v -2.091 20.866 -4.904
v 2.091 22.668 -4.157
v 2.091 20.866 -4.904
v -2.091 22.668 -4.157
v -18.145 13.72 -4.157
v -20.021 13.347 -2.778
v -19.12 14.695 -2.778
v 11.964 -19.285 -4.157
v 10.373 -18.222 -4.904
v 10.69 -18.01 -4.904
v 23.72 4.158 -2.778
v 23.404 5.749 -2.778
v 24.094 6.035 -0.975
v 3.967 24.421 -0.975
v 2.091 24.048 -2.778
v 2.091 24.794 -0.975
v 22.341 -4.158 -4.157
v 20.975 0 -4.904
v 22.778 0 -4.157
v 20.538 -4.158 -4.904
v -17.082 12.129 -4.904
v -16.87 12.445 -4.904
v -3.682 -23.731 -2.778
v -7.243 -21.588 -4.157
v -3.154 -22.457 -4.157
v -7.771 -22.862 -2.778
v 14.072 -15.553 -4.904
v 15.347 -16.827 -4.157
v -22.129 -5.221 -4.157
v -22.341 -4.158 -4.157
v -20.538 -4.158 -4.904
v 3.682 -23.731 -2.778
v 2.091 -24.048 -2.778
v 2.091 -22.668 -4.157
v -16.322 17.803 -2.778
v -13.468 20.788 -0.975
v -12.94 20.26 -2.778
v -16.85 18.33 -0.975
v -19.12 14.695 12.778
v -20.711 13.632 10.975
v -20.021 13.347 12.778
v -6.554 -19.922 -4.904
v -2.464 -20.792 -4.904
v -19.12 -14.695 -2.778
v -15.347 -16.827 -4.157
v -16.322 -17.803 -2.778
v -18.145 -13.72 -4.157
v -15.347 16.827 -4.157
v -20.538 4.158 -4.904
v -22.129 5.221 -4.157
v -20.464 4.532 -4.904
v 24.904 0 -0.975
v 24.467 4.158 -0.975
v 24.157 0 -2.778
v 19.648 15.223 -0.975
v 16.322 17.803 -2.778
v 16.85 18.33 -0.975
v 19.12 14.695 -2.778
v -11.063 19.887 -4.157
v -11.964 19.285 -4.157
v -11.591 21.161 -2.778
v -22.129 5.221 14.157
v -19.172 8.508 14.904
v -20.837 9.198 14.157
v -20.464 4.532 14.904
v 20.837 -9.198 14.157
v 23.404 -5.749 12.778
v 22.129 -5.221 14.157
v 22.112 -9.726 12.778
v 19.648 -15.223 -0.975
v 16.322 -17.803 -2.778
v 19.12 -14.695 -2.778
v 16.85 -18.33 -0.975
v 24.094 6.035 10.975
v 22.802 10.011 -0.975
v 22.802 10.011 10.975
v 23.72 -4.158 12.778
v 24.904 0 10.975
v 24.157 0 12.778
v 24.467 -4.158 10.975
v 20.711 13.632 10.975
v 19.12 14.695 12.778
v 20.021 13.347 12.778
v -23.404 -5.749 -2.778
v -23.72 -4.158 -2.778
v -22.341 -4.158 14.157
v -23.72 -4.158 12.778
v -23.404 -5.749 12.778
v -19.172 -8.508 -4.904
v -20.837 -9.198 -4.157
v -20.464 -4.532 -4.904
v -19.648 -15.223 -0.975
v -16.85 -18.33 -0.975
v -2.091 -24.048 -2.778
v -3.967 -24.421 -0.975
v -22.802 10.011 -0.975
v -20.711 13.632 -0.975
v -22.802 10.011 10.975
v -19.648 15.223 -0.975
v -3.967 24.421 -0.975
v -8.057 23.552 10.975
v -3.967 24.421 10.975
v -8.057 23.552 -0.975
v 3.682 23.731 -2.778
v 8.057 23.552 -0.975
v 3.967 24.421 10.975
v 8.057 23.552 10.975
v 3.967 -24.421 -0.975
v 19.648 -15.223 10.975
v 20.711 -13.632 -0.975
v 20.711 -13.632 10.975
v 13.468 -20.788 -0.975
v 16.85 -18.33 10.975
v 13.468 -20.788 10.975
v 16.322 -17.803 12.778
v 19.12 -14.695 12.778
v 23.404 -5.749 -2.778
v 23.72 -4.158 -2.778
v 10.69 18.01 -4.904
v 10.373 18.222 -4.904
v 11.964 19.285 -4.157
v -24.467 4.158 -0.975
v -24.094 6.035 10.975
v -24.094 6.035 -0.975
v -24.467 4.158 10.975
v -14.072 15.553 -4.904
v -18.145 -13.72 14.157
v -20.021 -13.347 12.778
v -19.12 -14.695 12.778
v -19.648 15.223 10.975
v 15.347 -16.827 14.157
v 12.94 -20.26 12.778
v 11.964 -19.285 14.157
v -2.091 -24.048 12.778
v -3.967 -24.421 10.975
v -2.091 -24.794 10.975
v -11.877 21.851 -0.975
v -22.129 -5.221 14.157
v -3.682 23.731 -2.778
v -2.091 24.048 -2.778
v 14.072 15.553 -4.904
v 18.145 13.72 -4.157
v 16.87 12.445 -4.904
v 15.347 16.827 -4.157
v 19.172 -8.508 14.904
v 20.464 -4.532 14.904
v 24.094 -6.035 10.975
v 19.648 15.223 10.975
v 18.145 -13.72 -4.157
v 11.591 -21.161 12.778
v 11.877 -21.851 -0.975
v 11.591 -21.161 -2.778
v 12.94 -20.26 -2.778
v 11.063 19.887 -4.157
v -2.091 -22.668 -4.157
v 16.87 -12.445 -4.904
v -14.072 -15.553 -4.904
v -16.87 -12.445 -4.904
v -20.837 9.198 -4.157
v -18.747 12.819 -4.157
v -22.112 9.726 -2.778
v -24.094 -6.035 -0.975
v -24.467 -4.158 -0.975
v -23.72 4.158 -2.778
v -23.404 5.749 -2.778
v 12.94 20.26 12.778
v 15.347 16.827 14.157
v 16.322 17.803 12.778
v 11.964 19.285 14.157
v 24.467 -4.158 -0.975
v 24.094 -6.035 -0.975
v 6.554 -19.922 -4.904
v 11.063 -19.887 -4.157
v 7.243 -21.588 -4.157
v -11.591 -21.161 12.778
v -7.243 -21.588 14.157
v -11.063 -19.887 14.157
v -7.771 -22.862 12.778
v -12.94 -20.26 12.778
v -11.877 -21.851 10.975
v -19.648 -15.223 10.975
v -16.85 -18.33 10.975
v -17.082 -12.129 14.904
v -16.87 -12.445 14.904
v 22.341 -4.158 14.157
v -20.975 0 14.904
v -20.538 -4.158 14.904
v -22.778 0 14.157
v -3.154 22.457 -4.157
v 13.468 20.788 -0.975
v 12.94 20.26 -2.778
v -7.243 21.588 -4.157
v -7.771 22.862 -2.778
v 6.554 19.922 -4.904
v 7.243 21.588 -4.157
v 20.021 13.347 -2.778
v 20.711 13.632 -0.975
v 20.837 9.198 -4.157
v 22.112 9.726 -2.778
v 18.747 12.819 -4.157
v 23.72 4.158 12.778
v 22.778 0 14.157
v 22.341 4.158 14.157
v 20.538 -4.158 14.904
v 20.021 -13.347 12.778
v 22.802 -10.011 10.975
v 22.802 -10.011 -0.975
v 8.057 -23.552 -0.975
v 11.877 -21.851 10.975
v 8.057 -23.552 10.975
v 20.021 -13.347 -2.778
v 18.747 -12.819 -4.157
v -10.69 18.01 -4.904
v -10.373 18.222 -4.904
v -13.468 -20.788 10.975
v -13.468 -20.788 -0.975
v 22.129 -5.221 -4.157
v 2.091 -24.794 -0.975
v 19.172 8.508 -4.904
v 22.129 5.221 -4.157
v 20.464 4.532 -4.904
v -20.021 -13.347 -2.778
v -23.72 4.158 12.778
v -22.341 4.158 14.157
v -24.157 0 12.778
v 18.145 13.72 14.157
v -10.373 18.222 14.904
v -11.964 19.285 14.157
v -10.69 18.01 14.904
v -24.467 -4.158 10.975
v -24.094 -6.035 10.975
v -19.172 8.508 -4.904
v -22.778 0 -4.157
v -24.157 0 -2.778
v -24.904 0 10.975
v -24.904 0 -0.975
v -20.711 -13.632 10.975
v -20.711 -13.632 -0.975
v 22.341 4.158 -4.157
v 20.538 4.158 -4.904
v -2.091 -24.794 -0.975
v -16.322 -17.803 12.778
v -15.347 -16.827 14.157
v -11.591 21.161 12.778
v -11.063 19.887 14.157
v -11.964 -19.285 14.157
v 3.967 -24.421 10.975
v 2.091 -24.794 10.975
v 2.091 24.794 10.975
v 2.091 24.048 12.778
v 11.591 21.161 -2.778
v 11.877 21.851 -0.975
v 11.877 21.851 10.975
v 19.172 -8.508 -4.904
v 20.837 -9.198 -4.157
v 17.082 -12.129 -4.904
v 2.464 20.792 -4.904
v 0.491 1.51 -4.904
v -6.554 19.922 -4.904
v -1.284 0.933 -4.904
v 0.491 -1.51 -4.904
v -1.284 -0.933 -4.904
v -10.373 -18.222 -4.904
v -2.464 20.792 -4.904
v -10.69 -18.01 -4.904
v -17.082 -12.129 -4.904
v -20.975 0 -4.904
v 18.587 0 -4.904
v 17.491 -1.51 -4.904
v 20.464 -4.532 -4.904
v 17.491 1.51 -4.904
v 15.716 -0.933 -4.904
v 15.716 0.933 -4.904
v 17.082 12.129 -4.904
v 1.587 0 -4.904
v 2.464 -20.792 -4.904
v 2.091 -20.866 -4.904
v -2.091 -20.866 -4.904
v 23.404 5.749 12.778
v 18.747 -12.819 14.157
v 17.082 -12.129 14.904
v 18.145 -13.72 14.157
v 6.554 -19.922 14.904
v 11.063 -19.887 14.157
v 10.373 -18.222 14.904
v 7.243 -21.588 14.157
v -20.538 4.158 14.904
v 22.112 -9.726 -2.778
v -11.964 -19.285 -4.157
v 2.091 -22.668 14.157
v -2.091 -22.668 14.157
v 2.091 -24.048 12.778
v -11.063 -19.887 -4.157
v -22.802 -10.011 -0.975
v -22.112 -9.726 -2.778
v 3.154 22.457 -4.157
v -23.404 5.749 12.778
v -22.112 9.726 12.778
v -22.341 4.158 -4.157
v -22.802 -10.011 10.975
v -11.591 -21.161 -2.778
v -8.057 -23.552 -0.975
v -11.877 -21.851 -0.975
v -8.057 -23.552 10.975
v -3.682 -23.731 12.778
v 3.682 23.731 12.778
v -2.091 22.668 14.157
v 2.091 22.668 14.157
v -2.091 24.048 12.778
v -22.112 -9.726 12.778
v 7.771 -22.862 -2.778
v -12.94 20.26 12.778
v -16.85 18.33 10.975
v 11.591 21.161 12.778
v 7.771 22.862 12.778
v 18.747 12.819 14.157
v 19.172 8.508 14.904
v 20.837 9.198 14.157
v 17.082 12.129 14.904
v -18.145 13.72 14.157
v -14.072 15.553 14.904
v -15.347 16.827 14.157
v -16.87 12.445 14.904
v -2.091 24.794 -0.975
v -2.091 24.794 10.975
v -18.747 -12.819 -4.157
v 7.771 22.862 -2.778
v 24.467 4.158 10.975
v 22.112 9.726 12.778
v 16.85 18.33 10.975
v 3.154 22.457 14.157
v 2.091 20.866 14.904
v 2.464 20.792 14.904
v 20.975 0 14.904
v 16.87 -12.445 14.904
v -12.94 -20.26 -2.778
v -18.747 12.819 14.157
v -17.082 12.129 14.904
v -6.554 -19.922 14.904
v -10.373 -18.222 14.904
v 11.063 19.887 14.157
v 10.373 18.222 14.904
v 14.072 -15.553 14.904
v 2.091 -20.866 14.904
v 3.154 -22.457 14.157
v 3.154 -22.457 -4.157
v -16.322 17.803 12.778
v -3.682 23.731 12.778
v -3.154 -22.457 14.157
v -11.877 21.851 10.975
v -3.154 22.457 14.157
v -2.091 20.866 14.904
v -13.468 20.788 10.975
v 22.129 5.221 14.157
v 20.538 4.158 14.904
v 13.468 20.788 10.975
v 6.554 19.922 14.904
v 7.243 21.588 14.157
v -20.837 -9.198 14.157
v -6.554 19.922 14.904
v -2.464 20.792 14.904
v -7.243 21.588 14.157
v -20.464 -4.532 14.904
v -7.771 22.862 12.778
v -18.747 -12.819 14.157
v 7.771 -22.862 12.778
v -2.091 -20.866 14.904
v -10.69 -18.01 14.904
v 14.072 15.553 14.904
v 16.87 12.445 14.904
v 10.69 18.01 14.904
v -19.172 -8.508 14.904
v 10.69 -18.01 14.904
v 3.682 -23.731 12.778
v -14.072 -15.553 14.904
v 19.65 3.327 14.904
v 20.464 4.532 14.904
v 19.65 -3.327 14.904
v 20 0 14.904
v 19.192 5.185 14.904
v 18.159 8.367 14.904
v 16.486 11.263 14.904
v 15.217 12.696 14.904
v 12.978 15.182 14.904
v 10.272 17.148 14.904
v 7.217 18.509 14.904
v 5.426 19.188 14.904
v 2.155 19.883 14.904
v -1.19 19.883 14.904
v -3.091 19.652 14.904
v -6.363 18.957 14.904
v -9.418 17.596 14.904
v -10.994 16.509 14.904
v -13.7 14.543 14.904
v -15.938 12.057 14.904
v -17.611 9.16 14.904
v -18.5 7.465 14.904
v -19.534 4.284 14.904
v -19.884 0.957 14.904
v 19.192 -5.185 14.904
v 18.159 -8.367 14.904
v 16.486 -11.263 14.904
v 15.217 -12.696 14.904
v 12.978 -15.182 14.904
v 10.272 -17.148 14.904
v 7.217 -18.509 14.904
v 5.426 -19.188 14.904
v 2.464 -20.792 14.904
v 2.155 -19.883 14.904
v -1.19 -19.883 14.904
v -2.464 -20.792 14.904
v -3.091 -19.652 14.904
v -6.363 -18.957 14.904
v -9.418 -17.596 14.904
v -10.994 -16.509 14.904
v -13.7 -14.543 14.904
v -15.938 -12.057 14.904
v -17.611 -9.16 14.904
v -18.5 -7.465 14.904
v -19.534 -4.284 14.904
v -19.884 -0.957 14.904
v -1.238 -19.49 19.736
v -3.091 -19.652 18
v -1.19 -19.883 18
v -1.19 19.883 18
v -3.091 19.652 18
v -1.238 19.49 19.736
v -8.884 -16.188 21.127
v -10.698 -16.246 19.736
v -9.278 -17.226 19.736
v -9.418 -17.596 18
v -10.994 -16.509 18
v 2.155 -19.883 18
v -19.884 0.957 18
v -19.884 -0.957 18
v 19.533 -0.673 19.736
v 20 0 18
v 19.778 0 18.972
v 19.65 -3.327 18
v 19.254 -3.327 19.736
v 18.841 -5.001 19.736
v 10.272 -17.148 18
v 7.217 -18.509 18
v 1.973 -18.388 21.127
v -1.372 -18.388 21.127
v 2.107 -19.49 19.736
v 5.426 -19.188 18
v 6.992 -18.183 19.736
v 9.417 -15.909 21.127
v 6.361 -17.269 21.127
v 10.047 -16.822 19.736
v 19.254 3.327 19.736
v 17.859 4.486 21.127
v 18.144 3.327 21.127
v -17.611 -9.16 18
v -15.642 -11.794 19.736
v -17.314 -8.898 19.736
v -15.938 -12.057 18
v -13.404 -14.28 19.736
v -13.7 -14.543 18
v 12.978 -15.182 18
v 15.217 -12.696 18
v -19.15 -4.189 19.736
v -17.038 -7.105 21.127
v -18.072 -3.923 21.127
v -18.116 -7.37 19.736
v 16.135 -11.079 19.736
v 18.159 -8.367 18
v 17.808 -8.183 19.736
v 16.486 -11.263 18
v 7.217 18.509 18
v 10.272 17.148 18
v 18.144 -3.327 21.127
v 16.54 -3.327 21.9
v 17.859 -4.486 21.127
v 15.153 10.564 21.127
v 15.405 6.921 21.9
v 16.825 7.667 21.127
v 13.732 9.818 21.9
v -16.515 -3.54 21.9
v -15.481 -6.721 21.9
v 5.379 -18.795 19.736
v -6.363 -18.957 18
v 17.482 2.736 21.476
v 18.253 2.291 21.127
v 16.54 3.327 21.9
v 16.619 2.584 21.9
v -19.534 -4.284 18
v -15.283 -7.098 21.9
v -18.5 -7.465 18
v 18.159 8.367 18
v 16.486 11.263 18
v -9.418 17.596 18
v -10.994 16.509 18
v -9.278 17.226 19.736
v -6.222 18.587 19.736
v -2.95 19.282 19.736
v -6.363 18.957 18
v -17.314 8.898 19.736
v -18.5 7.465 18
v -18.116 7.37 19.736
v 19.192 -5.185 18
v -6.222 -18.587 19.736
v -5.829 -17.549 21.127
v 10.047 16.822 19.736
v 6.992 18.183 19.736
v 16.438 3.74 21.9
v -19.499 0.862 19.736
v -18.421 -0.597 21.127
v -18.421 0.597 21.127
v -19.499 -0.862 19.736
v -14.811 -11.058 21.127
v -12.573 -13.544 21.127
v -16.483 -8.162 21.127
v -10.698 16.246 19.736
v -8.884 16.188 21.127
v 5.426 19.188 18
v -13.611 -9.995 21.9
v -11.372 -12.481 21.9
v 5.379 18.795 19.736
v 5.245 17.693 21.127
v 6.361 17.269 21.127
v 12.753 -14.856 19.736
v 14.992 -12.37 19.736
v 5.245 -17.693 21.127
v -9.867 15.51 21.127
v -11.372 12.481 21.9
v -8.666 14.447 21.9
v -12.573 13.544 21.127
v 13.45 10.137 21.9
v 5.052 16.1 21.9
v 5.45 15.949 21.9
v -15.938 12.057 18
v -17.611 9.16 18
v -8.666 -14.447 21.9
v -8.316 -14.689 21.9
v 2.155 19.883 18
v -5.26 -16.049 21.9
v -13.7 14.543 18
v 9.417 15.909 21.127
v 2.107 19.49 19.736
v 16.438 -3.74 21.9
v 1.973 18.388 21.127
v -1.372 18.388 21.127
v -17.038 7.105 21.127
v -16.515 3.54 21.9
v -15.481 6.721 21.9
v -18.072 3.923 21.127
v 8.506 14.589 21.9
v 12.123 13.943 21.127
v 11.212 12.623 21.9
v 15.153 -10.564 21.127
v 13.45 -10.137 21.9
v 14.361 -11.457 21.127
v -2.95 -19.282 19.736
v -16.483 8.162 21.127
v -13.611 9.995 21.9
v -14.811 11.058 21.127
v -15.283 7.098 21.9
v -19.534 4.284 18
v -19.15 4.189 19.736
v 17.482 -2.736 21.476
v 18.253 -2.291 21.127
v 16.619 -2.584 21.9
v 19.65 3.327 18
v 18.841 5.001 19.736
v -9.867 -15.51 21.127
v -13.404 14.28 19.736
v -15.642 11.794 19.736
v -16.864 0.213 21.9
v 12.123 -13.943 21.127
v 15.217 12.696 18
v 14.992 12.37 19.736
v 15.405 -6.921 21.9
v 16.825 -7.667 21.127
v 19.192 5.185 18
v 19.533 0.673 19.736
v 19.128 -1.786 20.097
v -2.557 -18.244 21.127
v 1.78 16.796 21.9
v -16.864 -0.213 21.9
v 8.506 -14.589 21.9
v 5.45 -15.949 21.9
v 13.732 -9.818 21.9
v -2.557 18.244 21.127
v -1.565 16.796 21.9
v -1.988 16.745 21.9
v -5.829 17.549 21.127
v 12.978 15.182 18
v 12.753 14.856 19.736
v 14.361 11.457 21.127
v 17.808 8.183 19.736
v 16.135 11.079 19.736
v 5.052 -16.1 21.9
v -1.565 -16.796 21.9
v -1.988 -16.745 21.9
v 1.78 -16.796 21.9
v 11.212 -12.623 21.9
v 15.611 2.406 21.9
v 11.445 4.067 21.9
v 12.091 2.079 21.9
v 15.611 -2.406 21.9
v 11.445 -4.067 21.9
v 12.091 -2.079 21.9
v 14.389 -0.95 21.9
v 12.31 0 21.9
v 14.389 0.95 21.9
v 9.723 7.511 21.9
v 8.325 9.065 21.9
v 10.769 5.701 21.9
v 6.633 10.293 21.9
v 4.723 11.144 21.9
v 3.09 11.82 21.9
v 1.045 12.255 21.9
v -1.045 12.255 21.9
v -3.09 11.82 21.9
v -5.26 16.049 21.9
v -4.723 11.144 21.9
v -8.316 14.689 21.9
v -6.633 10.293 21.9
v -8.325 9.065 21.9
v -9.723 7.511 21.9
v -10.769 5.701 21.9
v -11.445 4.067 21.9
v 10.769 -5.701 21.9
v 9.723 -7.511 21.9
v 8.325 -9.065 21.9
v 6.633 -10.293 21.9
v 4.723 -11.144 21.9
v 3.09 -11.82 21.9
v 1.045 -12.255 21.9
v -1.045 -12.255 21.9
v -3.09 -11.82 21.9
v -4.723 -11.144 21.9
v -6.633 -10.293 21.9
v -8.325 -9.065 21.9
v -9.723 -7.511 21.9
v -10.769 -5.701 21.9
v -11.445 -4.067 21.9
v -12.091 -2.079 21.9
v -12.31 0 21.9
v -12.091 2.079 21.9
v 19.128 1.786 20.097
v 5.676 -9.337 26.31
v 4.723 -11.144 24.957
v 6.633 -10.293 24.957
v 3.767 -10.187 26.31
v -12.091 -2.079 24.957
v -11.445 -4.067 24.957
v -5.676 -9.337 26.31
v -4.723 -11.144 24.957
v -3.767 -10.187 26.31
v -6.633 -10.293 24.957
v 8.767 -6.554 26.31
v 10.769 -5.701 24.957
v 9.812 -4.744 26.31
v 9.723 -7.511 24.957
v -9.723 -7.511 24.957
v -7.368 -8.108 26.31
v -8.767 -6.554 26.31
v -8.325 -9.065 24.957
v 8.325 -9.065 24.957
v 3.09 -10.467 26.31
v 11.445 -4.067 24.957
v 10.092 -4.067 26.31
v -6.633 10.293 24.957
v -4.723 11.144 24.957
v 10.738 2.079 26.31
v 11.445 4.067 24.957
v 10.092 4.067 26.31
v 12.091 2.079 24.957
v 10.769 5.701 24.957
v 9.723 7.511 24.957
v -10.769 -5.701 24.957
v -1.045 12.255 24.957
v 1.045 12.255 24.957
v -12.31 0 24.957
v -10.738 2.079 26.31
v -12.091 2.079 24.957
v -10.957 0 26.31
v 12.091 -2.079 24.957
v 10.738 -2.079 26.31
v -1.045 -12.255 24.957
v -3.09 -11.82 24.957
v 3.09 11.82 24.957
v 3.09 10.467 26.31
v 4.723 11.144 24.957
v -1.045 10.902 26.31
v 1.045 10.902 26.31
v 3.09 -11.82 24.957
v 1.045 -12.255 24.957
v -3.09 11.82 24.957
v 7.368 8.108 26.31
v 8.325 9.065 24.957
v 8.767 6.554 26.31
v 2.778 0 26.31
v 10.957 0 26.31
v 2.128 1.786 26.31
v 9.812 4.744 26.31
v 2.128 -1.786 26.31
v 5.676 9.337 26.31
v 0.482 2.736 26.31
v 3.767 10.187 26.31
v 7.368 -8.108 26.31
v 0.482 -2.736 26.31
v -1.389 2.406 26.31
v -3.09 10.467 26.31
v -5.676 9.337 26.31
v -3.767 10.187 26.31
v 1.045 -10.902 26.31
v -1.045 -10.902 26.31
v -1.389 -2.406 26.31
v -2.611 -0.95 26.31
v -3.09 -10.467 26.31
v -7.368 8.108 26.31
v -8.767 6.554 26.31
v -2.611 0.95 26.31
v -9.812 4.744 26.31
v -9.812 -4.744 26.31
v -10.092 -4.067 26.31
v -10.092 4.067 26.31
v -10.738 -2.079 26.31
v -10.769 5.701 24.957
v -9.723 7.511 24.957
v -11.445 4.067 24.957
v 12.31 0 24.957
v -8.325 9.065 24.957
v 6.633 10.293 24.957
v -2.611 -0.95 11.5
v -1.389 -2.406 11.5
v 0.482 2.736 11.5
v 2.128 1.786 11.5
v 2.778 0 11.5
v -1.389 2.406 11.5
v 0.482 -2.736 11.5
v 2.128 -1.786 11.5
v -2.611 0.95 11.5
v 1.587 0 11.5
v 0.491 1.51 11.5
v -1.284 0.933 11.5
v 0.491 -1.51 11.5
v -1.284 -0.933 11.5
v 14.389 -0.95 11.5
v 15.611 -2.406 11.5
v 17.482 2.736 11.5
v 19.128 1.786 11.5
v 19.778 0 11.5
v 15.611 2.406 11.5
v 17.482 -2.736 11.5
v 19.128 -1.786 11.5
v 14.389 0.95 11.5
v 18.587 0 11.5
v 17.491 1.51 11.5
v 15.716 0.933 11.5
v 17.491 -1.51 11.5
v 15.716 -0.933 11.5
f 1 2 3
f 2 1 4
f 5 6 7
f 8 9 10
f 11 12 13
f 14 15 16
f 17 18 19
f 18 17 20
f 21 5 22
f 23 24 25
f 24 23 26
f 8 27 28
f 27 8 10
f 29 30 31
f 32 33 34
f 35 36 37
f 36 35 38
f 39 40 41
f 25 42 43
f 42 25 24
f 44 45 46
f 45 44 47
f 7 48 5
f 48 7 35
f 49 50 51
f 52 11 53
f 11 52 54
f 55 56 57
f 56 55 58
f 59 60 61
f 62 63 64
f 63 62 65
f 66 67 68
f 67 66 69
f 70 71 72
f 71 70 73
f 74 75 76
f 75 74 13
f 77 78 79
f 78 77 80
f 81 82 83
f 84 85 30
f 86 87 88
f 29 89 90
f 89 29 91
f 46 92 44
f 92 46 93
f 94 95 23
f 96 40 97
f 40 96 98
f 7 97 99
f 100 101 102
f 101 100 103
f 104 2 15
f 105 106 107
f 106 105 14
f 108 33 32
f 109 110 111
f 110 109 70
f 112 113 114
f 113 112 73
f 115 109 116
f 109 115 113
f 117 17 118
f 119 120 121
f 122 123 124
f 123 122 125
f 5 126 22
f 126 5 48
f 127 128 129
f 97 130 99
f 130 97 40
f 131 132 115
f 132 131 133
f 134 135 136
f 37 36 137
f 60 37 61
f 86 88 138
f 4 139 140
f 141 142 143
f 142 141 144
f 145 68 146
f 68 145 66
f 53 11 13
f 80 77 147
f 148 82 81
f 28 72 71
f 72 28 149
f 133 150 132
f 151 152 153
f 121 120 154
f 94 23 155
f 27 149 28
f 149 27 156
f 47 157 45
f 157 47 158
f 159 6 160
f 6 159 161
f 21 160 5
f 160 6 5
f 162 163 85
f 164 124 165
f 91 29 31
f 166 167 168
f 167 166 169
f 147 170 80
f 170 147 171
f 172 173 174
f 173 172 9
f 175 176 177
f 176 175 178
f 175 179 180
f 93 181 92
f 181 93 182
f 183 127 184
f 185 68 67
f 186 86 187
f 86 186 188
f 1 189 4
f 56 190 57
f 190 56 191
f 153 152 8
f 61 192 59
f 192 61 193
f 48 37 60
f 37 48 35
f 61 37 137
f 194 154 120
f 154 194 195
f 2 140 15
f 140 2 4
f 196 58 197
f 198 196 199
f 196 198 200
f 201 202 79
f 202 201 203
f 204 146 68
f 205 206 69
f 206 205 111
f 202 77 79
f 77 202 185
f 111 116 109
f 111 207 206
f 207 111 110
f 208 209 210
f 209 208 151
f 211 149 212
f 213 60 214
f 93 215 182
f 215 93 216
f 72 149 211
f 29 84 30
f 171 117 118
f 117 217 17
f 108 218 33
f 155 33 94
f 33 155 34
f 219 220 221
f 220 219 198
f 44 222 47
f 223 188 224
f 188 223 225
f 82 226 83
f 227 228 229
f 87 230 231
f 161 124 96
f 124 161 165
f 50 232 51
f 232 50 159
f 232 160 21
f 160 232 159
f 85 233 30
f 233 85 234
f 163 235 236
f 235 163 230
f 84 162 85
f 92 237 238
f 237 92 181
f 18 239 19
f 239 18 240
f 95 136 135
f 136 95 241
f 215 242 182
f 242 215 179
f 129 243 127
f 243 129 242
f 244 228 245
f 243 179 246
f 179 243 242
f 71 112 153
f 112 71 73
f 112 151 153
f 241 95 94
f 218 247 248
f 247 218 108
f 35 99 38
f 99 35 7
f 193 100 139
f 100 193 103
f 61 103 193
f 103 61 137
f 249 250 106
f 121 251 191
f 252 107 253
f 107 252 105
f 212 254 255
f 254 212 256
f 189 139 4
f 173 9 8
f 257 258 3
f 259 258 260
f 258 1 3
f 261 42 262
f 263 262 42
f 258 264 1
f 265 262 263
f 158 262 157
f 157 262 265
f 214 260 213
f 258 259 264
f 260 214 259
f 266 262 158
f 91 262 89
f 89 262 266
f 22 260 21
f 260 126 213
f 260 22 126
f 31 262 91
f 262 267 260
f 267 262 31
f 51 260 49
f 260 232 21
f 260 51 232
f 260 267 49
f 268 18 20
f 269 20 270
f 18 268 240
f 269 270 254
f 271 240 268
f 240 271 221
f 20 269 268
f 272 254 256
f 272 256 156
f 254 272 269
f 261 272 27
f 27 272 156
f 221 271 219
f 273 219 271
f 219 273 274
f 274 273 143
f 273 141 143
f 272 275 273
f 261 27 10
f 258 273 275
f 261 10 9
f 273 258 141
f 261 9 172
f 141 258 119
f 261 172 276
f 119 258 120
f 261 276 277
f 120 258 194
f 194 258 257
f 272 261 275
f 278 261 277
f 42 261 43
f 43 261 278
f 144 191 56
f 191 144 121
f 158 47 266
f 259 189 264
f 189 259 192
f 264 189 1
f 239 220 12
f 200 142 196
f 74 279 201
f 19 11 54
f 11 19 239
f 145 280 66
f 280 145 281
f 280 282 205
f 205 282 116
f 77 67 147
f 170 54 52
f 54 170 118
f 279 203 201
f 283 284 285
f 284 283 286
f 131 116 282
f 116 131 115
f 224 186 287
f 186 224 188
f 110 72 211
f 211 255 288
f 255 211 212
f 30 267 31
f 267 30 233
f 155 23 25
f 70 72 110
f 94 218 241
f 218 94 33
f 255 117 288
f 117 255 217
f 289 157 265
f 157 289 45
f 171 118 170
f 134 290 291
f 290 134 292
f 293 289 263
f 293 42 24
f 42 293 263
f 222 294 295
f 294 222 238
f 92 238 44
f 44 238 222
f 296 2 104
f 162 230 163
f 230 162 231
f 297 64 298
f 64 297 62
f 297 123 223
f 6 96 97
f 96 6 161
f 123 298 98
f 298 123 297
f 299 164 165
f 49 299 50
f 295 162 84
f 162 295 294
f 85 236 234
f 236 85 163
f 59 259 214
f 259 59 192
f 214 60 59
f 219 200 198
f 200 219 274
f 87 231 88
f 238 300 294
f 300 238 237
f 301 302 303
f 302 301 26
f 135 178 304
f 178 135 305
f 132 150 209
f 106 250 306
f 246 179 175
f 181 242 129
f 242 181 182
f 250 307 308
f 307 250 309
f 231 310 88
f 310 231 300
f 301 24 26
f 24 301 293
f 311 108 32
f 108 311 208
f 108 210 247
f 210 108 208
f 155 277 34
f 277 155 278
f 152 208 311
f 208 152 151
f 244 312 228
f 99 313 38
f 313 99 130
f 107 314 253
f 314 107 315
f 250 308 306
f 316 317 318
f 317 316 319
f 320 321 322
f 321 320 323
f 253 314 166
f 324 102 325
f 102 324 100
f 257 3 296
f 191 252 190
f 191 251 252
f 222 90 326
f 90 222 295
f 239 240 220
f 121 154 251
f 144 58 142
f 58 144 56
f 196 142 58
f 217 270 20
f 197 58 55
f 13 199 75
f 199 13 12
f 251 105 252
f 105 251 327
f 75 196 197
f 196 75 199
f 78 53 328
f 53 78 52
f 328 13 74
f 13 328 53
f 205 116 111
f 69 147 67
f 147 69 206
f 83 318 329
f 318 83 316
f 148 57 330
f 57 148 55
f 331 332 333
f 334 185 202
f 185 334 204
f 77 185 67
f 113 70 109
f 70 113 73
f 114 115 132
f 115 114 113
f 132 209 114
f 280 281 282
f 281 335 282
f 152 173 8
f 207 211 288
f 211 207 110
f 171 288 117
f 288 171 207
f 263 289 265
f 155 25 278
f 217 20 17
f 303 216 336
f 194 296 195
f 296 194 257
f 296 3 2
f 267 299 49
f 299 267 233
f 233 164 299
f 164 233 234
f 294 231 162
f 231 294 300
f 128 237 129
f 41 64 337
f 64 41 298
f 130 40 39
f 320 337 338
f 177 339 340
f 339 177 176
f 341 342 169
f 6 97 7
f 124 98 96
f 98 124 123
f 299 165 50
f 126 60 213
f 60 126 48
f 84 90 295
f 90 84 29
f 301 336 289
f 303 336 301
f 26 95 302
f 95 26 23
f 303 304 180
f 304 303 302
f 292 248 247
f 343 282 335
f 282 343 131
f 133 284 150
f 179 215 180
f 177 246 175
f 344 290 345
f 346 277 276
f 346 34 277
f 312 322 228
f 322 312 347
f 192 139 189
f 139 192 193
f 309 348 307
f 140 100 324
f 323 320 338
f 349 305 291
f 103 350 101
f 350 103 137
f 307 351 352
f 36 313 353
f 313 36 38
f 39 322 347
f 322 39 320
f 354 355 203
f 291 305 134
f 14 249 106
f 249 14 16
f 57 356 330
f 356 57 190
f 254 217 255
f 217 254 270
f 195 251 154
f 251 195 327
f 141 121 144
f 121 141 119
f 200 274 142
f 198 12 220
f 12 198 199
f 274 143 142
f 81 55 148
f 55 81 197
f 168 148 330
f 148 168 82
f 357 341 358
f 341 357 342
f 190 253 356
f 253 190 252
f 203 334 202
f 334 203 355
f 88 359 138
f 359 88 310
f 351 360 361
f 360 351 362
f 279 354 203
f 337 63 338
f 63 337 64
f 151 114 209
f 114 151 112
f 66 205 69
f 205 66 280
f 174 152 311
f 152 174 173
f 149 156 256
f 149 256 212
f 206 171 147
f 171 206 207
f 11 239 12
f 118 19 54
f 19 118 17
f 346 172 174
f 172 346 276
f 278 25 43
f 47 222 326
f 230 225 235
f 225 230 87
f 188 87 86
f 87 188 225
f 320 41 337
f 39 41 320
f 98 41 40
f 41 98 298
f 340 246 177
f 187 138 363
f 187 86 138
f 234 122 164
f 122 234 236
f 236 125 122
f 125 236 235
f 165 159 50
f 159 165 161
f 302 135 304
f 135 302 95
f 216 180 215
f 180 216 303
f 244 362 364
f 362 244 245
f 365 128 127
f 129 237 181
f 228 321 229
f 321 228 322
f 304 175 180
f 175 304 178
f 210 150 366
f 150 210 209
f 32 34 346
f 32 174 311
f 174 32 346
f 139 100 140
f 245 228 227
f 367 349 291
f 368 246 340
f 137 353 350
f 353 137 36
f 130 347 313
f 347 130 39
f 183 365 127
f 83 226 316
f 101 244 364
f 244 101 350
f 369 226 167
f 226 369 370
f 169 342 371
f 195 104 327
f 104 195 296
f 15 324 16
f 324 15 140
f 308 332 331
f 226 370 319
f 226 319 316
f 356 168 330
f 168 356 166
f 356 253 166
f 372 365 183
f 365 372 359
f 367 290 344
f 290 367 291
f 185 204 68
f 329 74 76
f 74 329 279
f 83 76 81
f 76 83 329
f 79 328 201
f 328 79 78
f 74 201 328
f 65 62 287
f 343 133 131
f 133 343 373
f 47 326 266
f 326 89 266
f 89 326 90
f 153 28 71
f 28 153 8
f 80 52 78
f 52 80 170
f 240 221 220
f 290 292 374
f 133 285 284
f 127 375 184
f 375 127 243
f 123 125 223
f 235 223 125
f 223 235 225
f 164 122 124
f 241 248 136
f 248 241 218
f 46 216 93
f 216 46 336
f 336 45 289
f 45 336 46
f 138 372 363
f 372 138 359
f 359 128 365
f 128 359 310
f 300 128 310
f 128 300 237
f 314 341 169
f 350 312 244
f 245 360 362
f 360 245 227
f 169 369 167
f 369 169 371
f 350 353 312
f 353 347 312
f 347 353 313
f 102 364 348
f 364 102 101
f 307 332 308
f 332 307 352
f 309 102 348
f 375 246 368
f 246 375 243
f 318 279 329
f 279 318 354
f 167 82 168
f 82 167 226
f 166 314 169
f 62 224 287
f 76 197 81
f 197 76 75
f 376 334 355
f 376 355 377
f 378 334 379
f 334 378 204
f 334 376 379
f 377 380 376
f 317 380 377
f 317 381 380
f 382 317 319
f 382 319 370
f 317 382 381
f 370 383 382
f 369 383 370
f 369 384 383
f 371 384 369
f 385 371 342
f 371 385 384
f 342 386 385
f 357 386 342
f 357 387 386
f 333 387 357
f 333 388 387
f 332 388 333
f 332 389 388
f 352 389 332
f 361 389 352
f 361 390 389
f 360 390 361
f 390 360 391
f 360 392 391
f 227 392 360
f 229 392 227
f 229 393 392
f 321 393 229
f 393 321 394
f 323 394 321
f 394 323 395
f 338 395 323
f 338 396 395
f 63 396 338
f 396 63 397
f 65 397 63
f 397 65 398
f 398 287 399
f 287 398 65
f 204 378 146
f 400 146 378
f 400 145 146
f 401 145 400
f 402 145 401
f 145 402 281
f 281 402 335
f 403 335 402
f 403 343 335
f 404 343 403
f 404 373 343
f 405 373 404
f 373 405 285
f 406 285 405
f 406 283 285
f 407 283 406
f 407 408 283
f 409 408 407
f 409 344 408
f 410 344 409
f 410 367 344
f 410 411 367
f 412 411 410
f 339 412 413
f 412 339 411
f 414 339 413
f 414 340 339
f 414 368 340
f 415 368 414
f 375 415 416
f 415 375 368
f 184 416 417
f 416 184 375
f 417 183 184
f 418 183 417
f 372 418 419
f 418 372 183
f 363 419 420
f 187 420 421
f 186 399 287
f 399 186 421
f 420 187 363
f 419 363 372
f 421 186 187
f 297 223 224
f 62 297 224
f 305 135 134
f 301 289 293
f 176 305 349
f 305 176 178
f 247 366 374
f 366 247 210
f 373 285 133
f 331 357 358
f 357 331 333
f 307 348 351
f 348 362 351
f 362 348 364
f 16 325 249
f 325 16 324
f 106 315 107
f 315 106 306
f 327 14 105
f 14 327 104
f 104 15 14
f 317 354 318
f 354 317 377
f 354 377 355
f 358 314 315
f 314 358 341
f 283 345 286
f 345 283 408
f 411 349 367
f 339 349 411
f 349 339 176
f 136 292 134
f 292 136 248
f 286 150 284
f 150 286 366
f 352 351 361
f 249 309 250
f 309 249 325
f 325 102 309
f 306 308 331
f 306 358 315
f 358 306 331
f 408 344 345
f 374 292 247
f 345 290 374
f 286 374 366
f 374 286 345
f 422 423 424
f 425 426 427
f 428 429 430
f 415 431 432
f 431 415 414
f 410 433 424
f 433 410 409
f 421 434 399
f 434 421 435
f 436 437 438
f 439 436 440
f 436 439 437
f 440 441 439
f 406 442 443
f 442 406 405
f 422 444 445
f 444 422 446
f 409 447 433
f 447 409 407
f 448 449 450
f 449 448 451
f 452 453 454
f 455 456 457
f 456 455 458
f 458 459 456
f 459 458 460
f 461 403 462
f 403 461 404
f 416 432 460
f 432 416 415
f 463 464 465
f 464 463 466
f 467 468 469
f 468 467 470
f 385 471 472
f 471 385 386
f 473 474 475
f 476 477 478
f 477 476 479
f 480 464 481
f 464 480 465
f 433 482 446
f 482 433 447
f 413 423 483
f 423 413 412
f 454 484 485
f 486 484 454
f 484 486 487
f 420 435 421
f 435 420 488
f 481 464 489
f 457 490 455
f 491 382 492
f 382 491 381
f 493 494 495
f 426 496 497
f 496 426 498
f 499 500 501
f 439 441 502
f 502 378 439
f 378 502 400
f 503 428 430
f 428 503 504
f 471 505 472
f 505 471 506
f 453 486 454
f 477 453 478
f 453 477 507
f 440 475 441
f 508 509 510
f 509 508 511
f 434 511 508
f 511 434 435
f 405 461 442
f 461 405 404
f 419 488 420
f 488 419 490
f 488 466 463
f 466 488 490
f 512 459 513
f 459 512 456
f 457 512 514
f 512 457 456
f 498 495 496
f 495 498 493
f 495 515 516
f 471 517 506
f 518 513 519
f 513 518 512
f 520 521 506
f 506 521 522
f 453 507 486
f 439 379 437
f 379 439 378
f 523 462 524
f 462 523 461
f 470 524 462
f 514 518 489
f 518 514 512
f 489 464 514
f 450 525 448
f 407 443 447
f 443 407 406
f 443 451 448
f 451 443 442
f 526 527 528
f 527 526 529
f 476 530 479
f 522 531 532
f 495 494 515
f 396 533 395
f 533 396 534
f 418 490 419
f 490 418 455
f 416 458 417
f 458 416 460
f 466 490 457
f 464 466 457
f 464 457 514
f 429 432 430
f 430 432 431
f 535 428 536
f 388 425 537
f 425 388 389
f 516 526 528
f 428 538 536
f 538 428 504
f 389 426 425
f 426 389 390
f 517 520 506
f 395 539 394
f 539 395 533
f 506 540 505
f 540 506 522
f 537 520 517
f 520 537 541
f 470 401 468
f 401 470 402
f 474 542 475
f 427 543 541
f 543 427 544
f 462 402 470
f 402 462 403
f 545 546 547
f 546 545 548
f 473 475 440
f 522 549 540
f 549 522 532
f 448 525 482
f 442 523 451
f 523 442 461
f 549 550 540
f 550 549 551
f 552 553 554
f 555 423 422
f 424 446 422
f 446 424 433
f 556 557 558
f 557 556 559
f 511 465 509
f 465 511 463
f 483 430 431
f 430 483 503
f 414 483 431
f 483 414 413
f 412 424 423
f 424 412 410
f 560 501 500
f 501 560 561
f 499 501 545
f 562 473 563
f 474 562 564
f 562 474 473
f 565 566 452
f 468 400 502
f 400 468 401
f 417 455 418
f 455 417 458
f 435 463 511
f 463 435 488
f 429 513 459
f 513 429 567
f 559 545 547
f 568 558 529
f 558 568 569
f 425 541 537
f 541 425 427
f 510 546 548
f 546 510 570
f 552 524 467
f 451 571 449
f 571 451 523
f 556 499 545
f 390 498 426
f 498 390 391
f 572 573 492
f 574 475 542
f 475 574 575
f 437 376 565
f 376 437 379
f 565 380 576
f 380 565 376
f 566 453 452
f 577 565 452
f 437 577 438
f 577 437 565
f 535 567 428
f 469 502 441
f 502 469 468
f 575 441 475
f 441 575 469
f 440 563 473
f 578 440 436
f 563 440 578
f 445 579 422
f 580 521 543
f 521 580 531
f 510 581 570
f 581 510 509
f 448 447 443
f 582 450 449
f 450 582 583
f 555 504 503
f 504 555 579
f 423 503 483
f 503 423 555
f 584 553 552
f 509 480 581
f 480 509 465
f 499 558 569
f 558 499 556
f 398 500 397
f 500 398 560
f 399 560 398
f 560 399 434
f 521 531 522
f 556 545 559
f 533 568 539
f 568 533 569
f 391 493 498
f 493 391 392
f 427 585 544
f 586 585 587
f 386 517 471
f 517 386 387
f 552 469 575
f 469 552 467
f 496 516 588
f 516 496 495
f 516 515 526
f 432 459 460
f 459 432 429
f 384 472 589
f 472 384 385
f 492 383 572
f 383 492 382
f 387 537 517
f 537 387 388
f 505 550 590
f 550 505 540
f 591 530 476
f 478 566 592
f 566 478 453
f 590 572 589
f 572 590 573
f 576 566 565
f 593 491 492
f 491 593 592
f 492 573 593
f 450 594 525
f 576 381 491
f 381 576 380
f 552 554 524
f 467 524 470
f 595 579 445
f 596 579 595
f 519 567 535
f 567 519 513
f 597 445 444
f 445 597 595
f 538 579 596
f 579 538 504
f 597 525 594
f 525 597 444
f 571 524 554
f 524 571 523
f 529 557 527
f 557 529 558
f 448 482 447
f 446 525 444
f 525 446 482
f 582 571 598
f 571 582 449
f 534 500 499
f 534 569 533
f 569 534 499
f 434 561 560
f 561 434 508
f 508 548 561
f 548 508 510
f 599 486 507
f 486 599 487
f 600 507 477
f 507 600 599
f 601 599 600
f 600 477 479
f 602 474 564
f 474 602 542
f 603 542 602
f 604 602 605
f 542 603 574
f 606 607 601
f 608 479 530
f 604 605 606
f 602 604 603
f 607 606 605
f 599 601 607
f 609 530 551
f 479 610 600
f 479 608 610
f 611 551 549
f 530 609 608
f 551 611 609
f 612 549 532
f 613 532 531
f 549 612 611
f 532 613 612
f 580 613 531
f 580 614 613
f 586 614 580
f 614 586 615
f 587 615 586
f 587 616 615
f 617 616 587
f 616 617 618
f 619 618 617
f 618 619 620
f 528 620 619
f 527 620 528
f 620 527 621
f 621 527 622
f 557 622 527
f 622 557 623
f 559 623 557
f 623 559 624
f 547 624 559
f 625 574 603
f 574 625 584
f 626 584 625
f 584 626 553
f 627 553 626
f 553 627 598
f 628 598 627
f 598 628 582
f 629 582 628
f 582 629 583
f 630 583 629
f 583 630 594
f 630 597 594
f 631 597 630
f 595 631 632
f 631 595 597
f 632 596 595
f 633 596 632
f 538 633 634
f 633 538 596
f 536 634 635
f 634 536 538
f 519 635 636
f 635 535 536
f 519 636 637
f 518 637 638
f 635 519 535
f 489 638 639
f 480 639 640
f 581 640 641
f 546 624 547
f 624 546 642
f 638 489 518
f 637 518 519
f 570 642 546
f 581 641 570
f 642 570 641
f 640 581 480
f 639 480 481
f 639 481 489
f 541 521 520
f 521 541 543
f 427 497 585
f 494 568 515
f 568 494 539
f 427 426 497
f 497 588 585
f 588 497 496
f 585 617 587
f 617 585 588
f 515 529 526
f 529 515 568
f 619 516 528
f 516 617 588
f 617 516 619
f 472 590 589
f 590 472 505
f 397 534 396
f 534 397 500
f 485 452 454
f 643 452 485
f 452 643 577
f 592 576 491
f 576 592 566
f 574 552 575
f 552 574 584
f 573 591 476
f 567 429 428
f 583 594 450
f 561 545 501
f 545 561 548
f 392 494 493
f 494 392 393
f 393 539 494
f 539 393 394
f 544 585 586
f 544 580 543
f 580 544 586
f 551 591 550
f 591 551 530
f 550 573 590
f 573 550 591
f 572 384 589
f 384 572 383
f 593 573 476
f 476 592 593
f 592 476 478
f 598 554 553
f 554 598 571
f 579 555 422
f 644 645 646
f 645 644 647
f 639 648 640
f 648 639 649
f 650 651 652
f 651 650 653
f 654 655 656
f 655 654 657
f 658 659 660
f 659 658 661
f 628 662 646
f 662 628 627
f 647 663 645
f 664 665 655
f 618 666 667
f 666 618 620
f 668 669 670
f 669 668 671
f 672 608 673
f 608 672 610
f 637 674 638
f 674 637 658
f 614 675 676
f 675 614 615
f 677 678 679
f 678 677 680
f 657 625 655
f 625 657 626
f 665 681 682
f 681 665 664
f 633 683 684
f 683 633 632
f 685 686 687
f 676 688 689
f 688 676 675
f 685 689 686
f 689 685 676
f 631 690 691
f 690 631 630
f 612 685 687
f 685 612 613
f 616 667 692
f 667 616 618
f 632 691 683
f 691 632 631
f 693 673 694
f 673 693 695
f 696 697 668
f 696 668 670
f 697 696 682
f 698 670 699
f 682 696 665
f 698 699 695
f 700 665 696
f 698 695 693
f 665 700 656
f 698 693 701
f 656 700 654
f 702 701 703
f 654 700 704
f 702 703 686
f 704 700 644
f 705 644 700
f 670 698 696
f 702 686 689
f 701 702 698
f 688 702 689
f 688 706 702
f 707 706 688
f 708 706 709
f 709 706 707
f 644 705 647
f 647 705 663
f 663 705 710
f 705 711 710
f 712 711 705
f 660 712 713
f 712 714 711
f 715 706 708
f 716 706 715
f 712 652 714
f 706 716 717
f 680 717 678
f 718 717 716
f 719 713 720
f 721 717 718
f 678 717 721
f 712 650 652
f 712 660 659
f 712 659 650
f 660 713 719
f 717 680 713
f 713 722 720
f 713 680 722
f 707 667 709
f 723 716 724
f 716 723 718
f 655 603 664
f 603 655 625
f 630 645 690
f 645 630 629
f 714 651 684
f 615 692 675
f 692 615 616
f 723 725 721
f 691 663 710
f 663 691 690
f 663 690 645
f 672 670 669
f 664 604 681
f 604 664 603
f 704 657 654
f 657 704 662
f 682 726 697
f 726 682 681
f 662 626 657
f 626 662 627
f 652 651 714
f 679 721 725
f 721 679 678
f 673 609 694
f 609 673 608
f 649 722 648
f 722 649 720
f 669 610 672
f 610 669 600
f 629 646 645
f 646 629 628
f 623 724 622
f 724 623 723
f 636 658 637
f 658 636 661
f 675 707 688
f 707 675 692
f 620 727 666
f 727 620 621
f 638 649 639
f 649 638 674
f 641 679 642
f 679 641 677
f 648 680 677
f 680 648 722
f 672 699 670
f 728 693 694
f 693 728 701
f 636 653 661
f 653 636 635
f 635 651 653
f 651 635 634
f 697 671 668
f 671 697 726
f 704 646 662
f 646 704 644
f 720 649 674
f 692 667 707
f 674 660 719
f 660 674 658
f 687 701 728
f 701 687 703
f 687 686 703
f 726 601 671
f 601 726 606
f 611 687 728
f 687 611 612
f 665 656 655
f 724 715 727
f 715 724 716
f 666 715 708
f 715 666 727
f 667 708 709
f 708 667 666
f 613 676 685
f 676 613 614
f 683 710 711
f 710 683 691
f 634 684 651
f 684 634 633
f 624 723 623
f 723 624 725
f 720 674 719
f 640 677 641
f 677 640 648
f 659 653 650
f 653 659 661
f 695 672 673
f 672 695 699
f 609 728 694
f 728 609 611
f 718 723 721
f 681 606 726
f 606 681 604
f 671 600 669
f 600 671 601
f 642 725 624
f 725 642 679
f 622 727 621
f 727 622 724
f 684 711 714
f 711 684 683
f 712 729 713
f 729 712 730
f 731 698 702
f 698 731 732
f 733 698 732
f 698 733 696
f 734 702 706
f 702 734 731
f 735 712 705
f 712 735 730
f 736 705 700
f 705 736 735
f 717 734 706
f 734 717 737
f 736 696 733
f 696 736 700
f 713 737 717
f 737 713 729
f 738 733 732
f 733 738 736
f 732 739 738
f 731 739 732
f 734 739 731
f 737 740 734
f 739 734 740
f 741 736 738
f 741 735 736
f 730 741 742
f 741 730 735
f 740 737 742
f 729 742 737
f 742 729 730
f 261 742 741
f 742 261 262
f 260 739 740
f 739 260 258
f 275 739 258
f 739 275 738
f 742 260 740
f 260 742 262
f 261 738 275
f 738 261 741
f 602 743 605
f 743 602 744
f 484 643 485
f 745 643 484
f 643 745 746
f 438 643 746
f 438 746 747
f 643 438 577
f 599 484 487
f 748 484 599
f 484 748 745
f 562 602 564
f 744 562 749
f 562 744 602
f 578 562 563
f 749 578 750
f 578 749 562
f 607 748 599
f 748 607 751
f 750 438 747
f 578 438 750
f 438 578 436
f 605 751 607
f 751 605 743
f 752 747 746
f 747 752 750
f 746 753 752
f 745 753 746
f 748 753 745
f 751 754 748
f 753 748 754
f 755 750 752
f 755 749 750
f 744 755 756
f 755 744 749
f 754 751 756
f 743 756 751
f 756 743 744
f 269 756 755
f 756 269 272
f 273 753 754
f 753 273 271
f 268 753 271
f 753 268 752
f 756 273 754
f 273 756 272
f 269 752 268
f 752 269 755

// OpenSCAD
module layer(h) {
    minkowski() {
      cylinder(h=h, d=4*h);
      // rounded corners
      sphere(h/2);
    }
}

module recess() {
    mag_dia = 5.55625;
    line_dia = 3.175;
    mag_depth = 15;
    line_depth = 30;
    
    translate([0,0,line_depth-mag_depth]) cylinder(h=mag_depth, d=mag_dia);
    translate([0,0,mag_depth-line_depth]) cylinder(h=line_depth, d=line_dia);
}

module head() {
    layer(10);
    translate([0,0,10]) layer(8);
    translate([0,0,19]) layer(5);
}

difference() {
//union() {
    head();
    translate([0,0,-3.5]) recess();
    translate([17,0,-3.5]) recess();
}
